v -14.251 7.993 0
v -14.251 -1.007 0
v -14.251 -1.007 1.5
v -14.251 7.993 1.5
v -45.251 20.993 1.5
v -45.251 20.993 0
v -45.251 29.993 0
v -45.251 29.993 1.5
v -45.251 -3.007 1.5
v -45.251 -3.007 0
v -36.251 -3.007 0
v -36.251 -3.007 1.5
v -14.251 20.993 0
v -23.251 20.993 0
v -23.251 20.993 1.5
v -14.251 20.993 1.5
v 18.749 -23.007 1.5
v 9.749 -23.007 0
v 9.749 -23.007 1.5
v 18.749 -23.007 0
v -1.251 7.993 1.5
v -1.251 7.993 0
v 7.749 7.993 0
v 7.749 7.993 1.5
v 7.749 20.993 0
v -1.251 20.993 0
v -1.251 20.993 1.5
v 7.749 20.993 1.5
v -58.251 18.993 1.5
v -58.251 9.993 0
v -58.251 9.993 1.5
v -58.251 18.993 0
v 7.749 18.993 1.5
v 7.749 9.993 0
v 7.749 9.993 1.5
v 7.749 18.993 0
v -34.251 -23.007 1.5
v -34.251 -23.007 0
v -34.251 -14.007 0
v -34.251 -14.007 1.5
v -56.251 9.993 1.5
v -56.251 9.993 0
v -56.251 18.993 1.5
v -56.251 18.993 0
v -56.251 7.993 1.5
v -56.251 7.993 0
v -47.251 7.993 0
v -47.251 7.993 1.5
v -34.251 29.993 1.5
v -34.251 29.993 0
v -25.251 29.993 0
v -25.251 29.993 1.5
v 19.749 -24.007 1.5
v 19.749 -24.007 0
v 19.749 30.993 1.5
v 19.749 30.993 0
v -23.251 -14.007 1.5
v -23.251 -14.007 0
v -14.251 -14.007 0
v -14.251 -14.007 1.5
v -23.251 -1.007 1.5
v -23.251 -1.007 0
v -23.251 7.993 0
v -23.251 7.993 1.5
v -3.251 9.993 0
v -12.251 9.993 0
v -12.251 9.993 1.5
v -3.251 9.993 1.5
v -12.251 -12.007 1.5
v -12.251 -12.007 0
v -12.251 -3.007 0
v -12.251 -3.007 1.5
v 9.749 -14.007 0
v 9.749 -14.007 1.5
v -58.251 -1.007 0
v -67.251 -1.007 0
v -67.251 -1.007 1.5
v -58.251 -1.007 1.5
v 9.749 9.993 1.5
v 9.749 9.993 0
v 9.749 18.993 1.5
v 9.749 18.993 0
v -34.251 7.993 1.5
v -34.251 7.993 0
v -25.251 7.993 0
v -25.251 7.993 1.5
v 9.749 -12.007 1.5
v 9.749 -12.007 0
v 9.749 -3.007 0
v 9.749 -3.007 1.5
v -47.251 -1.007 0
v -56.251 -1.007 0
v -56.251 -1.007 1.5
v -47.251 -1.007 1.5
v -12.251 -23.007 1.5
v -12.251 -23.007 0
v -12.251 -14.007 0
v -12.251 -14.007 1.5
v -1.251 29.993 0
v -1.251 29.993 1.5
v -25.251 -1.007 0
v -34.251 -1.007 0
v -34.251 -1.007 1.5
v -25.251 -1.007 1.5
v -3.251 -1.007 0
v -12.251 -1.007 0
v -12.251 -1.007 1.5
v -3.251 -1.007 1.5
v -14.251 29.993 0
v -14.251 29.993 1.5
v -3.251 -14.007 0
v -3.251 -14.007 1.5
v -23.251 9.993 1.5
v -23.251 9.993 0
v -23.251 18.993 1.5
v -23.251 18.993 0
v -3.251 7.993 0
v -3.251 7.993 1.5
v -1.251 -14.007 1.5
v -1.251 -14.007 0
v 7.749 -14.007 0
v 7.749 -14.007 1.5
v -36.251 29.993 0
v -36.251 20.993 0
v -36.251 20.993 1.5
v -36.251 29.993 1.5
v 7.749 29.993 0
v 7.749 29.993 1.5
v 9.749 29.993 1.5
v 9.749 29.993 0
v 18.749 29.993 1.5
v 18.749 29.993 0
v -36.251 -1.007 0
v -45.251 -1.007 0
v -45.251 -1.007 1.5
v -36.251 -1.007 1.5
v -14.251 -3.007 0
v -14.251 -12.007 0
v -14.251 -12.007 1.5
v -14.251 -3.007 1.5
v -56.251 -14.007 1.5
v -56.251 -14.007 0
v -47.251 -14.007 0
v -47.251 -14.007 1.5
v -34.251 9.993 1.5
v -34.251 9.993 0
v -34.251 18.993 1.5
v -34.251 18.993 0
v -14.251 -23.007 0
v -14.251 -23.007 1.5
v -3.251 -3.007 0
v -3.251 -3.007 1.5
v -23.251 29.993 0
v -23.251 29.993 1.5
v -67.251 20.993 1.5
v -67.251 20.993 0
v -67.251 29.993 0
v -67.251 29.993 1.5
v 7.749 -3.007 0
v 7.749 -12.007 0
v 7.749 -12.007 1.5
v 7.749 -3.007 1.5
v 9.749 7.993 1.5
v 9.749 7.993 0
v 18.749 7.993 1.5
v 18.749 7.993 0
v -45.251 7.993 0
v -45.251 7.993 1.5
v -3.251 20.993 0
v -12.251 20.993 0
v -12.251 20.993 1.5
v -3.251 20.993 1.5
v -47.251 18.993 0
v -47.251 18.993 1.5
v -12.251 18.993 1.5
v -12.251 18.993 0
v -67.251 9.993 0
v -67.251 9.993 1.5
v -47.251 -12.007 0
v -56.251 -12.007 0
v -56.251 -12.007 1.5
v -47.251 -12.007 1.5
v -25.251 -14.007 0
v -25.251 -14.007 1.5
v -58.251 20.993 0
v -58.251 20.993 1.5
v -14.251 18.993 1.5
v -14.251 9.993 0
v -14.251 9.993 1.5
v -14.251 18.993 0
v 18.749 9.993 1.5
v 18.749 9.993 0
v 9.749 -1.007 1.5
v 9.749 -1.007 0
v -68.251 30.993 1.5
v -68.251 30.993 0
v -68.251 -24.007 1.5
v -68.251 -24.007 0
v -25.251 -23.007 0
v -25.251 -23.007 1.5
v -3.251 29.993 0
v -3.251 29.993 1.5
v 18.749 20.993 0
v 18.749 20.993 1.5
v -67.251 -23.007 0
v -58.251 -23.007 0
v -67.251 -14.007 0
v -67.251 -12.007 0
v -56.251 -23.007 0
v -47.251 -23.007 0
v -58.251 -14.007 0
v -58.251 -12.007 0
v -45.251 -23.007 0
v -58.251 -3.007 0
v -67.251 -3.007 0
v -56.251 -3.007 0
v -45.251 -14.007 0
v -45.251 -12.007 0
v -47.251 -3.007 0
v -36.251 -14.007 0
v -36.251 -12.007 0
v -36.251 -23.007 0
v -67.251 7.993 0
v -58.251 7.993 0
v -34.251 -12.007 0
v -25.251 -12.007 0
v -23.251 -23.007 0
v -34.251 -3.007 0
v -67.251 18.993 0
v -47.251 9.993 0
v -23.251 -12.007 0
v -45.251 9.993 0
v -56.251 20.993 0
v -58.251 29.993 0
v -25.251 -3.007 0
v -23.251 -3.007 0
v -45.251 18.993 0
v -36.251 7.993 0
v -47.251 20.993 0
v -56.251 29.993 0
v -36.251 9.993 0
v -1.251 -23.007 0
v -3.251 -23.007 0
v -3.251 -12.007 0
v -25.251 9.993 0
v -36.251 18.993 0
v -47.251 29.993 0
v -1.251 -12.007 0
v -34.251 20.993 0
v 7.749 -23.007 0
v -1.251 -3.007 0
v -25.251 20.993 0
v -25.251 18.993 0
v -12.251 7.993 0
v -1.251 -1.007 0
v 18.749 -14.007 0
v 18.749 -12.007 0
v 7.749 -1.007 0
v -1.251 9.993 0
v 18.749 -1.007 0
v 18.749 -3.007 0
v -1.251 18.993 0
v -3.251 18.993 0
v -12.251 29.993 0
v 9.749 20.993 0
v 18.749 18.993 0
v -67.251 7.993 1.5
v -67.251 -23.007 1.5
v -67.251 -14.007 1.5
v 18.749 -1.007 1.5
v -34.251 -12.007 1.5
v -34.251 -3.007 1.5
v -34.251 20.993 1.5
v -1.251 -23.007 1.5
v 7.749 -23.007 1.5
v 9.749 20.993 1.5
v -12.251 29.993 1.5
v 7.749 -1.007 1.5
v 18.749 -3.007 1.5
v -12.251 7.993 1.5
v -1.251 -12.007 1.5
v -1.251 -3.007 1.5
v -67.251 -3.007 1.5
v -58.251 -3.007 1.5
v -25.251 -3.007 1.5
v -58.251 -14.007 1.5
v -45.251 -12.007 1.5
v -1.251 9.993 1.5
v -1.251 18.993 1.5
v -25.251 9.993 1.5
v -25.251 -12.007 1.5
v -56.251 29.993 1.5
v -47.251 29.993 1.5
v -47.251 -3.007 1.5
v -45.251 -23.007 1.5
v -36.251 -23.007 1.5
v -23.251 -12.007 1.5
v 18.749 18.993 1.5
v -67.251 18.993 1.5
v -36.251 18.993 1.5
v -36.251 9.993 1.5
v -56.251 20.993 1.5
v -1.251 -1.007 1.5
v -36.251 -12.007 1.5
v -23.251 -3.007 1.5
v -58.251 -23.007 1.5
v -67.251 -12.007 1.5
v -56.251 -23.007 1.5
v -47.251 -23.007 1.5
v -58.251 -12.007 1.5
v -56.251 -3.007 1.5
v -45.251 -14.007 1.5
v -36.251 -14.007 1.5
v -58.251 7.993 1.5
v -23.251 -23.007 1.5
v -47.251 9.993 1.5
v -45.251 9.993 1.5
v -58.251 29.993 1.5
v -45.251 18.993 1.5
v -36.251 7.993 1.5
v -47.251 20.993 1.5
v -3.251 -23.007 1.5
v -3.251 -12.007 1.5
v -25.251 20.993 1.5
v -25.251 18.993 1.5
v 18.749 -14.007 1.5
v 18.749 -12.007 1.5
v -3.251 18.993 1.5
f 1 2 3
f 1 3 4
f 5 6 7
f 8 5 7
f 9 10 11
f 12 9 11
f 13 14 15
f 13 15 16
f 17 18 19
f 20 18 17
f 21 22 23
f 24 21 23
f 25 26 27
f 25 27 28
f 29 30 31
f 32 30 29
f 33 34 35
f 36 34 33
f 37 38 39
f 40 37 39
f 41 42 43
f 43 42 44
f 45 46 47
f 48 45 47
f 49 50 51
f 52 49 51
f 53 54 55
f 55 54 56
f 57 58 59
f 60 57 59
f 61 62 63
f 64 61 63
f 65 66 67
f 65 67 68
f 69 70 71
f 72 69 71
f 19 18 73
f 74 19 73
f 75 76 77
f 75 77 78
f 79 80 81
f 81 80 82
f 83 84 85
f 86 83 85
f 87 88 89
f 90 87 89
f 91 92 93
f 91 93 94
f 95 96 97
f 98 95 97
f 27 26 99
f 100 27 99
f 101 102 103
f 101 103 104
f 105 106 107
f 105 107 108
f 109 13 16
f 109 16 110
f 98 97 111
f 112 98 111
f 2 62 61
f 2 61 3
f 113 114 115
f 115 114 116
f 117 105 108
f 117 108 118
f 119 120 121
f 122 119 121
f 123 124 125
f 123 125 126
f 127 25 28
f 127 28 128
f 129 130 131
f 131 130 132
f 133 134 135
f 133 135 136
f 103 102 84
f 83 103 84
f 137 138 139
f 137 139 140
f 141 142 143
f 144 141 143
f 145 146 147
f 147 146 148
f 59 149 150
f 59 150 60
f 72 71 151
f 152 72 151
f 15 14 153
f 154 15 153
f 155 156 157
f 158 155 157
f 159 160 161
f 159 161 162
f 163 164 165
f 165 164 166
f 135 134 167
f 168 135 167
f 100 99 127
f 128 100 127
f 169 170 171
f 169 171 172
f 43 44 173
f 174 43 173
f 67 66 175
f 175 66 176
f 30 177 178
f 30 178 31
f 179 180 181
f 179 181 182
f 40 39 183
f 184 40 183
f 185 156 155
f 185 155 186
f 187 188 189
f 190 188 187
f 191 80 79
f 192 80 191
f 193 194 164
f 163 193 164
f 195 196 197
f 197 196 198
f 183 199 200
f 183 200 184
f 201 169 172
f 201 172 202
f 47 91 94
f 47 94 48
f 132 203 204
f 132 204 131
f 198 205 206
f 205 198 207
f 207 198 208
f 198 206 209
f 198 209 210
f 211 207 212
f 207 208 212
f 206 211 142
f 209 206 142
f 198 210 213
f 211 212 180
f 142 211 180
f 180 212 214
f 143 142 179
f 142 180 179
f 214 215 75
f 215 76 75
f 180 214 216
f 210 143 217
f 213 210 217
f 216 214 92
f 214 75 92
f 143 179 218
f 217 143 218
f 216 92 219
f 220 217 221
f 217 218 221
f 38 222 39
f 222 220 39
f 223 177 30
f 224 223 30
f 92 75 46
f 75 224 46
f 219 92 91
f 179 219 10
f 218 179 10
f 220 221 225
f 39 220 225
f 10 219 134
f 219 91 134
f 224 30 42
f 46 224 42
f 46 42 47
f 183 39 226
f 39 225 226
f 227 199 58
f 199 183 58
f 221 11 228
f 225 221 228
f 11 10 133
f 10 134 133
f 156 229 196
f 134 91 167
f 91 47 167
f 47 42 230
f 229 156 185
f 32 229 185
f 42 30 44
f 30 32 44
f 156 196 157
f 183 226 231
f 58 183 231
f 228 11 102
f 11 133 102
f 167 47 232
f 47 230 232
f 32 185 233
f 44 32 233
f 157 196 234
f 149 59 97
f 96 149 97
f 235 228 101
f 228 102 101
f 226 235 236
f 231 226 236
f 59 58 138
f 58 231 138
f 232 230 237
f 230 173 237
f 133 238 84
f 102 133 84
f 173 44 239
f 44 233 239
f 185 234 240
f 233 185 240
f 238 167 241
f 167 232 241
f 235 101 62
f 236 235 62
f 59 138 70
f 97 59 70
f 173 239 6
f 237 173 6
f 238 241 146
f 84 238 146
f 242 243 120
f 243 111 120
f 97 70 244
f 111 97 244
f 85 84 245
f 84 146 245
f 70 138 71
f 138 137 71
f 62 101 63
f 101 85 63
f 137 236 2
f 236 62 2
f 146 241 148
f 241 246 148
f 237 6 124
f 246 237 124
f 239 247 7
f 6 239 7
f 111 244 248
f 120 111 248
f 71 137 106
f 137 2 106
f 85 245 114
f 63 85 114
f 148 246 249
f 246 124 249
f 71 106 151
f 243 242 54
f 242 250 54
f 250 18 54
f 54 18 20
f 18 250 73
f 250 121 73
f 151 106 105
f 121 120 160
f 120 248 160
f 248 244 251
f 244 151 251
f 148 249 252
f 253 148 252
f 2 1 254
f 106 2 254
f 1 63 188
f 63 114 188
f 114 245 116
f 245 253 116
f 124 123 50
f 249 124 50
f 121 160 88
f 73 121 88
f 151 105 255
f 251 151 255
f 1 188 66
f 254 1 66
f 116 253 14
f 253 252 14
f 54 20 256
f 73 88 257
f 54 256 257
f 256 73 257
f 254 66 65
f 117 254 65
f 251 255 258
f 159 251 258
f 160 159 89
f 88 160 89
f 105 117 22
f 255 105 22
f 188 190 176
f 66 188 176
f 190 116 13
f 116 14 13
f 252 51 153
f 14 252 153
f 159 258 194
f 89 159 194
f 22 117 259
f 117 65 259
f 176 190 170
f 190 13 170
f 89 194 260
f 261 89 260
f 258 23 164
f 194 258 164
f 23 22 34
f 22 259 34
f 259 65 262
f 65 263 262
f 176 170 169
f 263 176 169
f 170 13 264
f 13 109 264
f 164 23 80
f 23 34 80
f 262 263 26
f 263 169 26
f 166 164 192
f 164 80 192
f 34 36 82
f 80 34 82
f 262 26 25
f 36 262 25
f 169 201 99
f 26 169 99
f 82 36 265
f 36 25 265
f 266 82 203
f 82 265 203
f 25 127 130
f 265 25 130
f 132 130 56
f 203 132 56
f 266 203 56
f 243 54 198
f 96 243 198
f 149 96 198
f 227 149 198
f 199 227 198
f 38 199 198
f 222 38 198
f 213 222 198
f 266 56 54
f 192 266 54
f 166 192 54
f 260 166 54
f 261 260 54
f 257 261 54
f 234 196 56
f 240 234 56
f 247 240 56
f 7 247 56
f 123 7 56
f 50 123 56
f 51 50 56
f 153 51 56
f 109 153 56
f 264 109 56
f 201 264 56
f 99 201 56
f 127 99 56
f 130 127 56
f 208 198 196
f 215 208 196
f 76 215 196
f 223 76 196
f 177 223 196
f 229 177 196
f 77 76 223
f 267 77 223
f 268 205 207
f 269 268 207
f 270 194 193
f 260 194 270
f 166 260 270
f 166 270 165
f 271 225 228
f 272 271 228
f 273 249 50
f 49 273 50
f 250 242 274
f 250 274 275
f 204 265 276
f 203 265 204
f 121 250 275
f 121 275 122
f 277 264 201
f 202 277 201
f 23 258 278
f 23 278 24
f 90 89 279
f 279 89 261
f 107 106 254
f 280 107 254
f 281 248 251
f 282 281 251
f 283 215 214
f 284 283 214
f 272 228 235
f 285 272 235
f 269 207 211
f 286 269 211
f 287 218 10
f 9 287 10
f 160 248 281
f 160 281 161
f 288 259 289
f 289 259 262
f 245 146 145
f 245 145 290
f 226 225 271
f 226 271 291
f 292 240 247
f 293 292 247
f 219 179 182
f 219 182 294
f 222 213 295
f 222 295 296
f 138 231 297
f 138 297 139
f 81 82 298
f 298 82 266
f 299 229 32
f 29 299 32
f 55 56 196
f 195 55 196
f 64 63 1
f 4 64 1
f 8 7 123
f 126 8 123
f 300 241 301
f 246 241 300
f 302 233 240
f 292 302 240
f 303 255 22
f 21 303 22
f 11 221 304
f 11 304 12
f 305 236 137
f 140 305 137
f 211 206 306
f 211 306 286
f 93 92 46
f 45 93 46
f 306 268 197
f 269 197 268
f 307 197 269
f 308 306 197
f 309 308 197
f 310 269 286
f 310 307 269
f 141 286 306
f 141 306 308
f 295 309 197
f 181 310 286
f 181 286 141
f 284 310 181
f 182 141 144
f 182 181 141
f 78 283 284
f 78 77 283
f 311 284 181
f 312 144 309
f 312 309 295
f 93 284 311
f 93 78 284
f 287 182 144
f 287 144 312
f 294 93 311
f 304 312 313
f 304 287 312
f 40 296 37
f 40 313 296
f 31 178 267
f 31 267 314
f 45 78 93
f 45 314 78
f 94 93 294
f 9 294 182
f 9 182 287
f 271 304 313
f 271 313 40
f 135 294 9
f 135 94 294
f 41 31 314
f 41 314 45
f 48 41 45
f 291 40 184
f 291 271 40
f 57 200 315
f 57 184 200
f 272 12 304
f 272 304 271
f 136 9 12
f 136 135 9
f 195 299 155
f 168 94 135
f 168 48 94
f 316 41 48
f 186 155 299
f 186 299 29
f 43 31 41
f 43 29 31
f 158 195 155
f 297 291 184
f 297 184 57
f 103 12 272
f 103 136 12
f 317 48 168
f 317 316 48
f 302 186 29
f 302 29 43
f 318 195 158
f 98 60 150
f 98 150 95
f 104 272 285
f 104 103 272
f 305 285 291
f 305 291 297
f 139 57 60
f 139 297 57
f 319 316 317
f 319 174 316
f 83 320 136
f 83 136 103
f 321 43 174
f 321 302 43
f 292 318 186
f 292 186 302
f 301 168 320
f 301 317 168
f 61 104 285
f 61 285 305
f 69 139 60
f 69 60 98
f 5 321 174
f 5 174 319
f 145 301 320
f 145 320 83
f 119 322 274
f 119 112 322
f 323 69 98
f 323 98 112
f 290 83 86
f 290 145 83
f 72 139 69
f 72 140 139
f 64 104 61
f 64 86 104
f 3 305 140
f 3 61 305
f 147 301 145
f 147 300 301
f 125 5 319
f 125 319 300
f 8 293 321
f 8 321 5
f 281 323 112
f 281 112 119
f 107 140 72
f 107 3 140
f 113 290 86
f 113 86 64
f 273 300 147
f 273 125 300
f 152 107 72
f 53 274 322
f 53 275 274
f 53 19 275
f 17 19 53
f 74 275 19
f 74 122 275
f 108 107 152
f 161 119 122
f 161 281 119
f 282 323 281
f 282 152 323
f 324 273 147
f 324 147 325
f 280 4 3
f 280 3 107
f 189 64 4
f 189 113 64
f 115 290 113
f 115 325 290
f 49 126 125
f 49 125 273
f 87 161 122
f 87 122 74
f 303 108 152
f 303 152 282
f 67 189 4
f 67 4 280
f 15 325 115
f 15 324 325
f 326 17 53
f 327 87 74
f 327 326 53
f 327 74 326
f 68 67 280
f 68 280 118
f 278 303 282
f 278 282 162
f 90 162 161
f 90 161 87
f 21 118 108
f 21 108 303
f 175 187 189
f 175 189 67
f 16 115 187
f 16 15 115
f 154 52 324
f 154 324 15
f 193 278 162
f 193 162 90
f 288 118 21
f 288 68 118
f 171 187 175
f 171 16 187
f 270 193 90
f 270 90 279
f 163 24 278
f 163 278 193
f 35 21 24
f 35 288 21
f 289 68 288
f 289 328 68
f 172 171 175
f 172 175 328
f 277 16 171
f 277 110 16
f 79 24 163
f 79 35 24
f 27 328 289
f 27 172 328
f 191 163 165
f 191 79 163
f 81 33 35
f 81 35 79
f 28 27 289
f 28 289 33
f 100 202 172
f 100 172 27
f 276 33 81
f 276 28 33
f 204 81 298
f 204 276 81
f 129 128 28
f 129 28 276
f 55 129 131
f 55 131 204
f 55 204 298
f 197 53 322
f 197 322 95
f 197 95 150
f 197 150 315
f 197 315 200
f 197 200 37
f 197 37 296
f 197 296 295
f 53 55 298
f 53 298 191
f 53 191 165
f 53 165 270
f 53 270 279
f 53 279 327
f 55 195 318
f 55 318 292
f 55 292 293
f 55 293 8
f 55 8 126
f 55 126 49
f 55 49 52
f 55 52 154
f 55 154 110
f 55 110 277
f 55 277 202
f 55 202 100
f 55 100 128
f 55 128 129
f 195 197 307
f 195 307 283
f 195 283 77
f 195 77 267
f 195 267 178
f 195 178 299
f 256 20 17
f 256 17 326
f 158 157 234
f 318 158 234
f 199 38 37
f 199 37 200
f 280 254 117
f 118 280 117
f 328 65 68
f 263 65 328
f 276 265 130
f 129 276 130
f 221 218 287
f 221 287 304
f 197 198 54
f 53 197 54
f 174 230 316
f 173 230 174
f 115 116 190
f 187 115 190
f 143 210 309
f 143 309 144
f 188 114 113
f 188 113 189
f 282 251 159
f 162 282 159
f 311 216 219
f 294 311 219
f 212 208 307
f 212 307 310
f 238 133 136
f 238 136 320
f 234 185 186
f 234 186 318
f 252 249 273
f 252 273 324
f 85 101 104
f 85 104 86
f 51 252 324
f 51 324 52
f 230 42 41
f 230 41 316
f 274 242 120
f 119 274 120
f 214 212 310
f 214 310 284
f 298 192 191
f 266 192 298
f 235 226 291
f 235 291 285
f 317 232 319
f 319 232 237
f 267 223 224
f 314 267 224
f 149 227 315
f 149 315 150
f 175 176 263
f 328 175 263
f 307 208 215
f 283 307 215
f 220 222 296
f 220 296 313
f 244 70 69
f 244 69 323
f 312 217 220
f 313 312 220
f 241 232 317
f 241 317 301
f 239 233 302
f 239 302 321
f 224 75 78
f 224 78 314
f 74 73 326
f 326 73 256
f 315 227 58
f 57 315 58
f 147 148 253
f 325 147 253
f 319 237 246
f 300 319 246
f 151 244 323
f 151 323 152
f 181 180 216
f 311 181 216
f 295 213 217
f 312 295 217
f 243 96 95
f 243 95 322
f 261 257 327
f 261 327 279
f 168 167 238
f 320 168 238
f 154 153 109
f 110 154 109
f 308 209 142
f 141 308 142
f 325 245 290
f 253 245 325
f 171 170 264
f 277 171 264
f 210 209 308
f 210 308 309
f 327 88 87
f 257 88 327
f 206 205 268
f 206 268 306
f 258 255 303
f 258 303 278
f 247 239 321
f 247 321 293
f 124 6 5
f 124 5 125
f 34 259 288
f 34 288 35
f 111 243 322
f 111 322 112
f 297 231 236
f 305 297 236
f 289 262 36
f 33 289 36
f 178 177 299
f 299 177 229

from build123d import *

# Parameters (mm, degrees)
F0_W     = 11
F0_H     = 11
F0_W_2   = 9
F0_H_2   = 9
F1_DEPTH = 1.5


with BuildPart() as f1:
    # F0 (on Top) → F1 (new body)
    with BuildSketch(Plane.XY):
        with Locations((-29.751156, 3.492917)):
            Rectangle(F0_W, F0_H)
        with Locations((-29.751156, 3.492917)):
            Rectangle(F0_W_2, F0_H_2, mode=Mode.SUBTRACT)
        with Locations((-40.751156, 3.492917)):
            Rectangle(F0_W, F0_H)
        with Locations((-40.751156, 3.492917)):
            Rectangle(F0_W_2, F0_H_2, mode=Mode.SUBTRACT)
        with Locations((-51.751156, 3.492917)):
            Rectangle(F0_W, F0_H)
        with Locations((-51.751156, 3.492917)):
            Rectangle(F0_W_2, F0_H_2, mode=Mode.SUBTRACT)
        with Locations((-62.751156, 3.492917)):
            Rectangle(F0_W, F0_H)
        with Locations((-62.751156, 3.492917)):
            Rectangle(F0_W_2, F0_H_2, mode=Mode.SUBTRACT)
        with Locations((-51.751156, -7.507083)):
            Rectangle(F0_W, F0_H)
        with Locations((-51.751156, -7.507083)):
            Rectangle(F0_W_2, F0_H_2, mode=Mode.SUBTRACT)
        with Locations((-62.751156, -7.507083)):
            Rectangle(F0_W, F0_H)
        with Locations((-62.751156, -7.507083)):
            Rectangle(F0_W_2, F0_H_2, mode=Mode.SUBTRACT)
        with Locations((-62.751156, -18.507083)):
            Rectangle(F0_W, F0_H)
        with Locations((-62.751156, -18.507083)):
            Rectangle(F0_W_2, F0_H_2, mode=Mode.SUBTRACT)
        with Locations((-51.751156, -18.507083)):
            Rectangle(F0_W, F0_H)
        with Locations((-51.751156, -18.507083)):
            Rectangle(F0_W_2, F0_H_2, mode=Mode.SUBTRACT)
        with Locations((-40.751156, -7.507083)):
            Rectangle(F0_W, F0_H)
        with Locations((-40.751156, -7.507083)):
            Rectangle(F0_W_2, F0_H_2, mode=Mode.SUBTRACT)
        with Locations((-40.751156, -18.507083)):
            Rectangle(F0_W, F0_H)
        with Locations((-40.751156, -18.507083)):
            Rectangle(F0_W_2, F0_H_2, mode=Mode.SUBTRACT)
        with Locations((-29.751156, -18.507083)):
            Rectangle(F0_W, F0_H)
        with Locations((-29.751156, -18.507083)):
            Rectangle(F0_W_2, F0_H_2, mode=Mode.SUBTRACT)
        with Locations((-29.751156, -7.507083)):
            Rectangle(F0_W, F0_H)
        with Locations((-29.751156, -7.507083)):
            Rectangle(F0_W_2, F0_H_2, mode=Mode.SUBTRACT)
        with Locations((-18.751156, -7.507083)):
            Rectangle(F0_W, F0_H)
        with Locations((-18.751156, -7.507083)):
            Rectangle(F0_W_2, F0_H_2, mode=Mode.SUBTRACT)
        with Locations((-18.751156, 3.492917)):
            Rectangle(F0_W, F0_H)
        with Locations((-18.751156, 3.492917)):
            Rectangle(F0_W_2, F0_H_2, mode=Mode.SUBTRACT)
        with Locations((-18.751156, -18.507083)):
            Rectangle(F0_W, F0_H)
        with Locations((-18.751156, -18.507083)):
            Rectangle(F0_W_2, F0_H_2, mode=Mode.SUBTRACT)
        with Locations((-7.751156, -18.507083)):
            Rectangle(F0_W, F0_H)
        with Locations((-7.751156, -18.507083)):
            Rectangle(F0_W_2, F0_H_2, mode=Mode.SUBTRACT)
        with Locations((-7.751156, -7.507083)):
            Rectangle(F0_W, F0_H)
        with Locations((-7.751156, -7.507083)):
            Rectangle(F0_W_2, F0_H_2, mode=Mode.SUBTRACT)
        with Locations((3.248844, -7.507083)):
            Rectangle(F0_W, F0_H)
        with Locations((3.248844, -7.507083)):
            Rectangle(F0_W_2, F0_H_2, mode=Mode.SUBTRACT)
        with Locations((3.248844, -18.507083)):
            Rectangle(F0_W, F0_H)
        with Locations((3.248844, -18.507083)):
            Rectangle(F0_W_2, F0_H_2, mode=Mode.SUBTRACT)
        with Locations((14.248844, -18.507083)):
            Rectangle(F0_W, F0_H)
        with Locations((14.248844, -18.507083)):
            Rectangle(F0_W_2, F0_H_2, mode=Mode.SUBTRACT)
        with Locations((14.248844, -7.507083)):
            Rectangle(F0_W, F0_H)
        with Locations((14.248844, -7.507083)):
            Rectangle(F0_W_2, F0_H_2, mode=Mode.SUBTRACT)
        with Locations((14.248844, 3.492917)):
            Rectangle(F0_W, F0_H)
        with Locations((14.248844, 3.492917)):
            Rectangle(F0_W_2, F0_H_2, mode=Mode.SUBTRACT)
        with Locations((3.248844, 3.492917)):
            Rectangle(F0_W, F0_H)
        with Locations((3.248844, 3.492917)):
            Rectangle(F0_W_2, F0_H_2, mode=Mode.SUBTRACT)
        with Locations((-7.751156, 3.492917)):
            Rectangle(F0_W, F0_H)
        with Locations((-7.751156, 3.492917)):
            Rectangle(F0_W_2, F0_H_2, mode=Mode.SUBTRACT)
        with Locations((14.248844, 14.492917)):
            Rectangle(F0_W, F0_H)
        with Locations((14.248844, 14.492917)):
            Rectangle(F0_W_2, F0_H_2, mode=Mode.SUBTRACT)
        with Locations((3.248844, 14.492917)):
            Rectangle(F0_W, F0_H)
        with Locations((3.248844, 14.492917)):
            Rectangle(F0_W_2, F0_H_2, mode=Mode.SUBTRACT)
        with Locations((-7.751156, 14.492917)):
            Rectangle(F0_W, F0_H)
        with Locations((-7.751156, 14.492917)):
            Rectangle(F0_W_2, F0_H_2, mode=Mode.SUBTRACT)
        with Locations((14.248844, 25.492917)):
            Rectangle(F0_W, F0_H)
        with Locations((14.248844, 25.492917)):
            Rectangle(F0_W_2, F0_H_2, mode=Mode.SUBTRACT)
        with Locations((3.248844, 25.492917)):
            Rectangle(F0_W, F0_H)
        with Locations((3.248844, 25.492917)):
            Rectangle(F0_W_2, F0_H_2, mode=Mode.SUBTRACT)
        with Locations((-18.751156, 14.492917)):
            Rectangle(F0_W, F0_H)
        with Locations((-18.751156, 14.492917)):
            Rectangle(F0_W_2, F0_H_2, mode=Mode.SUBTRACT)
        with Locations((-7.751156, 25.492917)):
            Rectangle(F0_W, F0_H)
        with Locations((-7.751156, 25.492917)):
            Rectangle(F0_W_2, F0_H_2, mode=Mode.SUBTRACT)
        with Locations((-18.751156, 25.492917)):
            Rectangle(F0_W, F0_H)
        with Locations((-18.751156, 25.492917)):
            Rectangle(F0_W_2, F0_H_2, mode=Mode.SUBTRACT)
        with Locations((-29.751156, 14.492917)):
            Rectangle(F0_W, F0_H)
        with Locations((-29.751156, 14.492917)):
            Rectangle(F0_W_2, F0_H_2, mode=Mode.SUBTRACT)
        with Locations((-29.751156, 25.492917)):
            Rectangle(F0_W, F0_H)
        with Locations((-29.751156, 25.492917)):
            Rectangle(F0_W_2, F0_H_2, mode=Mode.SUBTRACT)
        with Locations((-40.751156, 14.492917)):
            Rectangle(F0_W, F0_H)
        with Locations((-40.751156, 14.492917)):
            Rectangle(F0_W_2, F0_H_2, mode=Mode.SUBTRACT)
        with Locations((-40.751156, 25.492917)):
            Rectangle(F0_W, F0_H)
        with Locations((-40.751156, 25.492917)):
            Rectangle(F0_W_2, F0_H_2, mode=Mode.SUBTRACT)
        with Locations((-51.751156, 14.492917)):
            Rectangle(F0_W, F0_H)
        with Locations((-51.751156, 14.492917)):
            Rectangle(F0_W_2, F0_H_2, mode=Mode.SUBTRACT)
        with Locations((-51.751156, 25.492917)):
            Rectangle(F0_W, F0_H)
        with Locations((-51.751156, 25.492917)):
            Rectangle(F0_W_2, F0_H_2, mode=Mode.SUBTRACT)
        with Locations((-62.751156, 14.492917)):
            Rectangle(F0_W, F0_H)
        with Locations((-62.751156, 14.492917)):
            Rectangle(F0_W_2, F0_H_2, mode=Mode.SUBTRACT)
        with Locations((-62.751156, 25.492917)):
            Rectangle(F0_W, F0_H)
        with Locations((-62.751156, 25.492917)):
            Rectangle(F0_W_2, F0_H_2, mode=Mode.SUBTRACT)
    extrude(amount=F1_DEPTH)


solid = f1.part
